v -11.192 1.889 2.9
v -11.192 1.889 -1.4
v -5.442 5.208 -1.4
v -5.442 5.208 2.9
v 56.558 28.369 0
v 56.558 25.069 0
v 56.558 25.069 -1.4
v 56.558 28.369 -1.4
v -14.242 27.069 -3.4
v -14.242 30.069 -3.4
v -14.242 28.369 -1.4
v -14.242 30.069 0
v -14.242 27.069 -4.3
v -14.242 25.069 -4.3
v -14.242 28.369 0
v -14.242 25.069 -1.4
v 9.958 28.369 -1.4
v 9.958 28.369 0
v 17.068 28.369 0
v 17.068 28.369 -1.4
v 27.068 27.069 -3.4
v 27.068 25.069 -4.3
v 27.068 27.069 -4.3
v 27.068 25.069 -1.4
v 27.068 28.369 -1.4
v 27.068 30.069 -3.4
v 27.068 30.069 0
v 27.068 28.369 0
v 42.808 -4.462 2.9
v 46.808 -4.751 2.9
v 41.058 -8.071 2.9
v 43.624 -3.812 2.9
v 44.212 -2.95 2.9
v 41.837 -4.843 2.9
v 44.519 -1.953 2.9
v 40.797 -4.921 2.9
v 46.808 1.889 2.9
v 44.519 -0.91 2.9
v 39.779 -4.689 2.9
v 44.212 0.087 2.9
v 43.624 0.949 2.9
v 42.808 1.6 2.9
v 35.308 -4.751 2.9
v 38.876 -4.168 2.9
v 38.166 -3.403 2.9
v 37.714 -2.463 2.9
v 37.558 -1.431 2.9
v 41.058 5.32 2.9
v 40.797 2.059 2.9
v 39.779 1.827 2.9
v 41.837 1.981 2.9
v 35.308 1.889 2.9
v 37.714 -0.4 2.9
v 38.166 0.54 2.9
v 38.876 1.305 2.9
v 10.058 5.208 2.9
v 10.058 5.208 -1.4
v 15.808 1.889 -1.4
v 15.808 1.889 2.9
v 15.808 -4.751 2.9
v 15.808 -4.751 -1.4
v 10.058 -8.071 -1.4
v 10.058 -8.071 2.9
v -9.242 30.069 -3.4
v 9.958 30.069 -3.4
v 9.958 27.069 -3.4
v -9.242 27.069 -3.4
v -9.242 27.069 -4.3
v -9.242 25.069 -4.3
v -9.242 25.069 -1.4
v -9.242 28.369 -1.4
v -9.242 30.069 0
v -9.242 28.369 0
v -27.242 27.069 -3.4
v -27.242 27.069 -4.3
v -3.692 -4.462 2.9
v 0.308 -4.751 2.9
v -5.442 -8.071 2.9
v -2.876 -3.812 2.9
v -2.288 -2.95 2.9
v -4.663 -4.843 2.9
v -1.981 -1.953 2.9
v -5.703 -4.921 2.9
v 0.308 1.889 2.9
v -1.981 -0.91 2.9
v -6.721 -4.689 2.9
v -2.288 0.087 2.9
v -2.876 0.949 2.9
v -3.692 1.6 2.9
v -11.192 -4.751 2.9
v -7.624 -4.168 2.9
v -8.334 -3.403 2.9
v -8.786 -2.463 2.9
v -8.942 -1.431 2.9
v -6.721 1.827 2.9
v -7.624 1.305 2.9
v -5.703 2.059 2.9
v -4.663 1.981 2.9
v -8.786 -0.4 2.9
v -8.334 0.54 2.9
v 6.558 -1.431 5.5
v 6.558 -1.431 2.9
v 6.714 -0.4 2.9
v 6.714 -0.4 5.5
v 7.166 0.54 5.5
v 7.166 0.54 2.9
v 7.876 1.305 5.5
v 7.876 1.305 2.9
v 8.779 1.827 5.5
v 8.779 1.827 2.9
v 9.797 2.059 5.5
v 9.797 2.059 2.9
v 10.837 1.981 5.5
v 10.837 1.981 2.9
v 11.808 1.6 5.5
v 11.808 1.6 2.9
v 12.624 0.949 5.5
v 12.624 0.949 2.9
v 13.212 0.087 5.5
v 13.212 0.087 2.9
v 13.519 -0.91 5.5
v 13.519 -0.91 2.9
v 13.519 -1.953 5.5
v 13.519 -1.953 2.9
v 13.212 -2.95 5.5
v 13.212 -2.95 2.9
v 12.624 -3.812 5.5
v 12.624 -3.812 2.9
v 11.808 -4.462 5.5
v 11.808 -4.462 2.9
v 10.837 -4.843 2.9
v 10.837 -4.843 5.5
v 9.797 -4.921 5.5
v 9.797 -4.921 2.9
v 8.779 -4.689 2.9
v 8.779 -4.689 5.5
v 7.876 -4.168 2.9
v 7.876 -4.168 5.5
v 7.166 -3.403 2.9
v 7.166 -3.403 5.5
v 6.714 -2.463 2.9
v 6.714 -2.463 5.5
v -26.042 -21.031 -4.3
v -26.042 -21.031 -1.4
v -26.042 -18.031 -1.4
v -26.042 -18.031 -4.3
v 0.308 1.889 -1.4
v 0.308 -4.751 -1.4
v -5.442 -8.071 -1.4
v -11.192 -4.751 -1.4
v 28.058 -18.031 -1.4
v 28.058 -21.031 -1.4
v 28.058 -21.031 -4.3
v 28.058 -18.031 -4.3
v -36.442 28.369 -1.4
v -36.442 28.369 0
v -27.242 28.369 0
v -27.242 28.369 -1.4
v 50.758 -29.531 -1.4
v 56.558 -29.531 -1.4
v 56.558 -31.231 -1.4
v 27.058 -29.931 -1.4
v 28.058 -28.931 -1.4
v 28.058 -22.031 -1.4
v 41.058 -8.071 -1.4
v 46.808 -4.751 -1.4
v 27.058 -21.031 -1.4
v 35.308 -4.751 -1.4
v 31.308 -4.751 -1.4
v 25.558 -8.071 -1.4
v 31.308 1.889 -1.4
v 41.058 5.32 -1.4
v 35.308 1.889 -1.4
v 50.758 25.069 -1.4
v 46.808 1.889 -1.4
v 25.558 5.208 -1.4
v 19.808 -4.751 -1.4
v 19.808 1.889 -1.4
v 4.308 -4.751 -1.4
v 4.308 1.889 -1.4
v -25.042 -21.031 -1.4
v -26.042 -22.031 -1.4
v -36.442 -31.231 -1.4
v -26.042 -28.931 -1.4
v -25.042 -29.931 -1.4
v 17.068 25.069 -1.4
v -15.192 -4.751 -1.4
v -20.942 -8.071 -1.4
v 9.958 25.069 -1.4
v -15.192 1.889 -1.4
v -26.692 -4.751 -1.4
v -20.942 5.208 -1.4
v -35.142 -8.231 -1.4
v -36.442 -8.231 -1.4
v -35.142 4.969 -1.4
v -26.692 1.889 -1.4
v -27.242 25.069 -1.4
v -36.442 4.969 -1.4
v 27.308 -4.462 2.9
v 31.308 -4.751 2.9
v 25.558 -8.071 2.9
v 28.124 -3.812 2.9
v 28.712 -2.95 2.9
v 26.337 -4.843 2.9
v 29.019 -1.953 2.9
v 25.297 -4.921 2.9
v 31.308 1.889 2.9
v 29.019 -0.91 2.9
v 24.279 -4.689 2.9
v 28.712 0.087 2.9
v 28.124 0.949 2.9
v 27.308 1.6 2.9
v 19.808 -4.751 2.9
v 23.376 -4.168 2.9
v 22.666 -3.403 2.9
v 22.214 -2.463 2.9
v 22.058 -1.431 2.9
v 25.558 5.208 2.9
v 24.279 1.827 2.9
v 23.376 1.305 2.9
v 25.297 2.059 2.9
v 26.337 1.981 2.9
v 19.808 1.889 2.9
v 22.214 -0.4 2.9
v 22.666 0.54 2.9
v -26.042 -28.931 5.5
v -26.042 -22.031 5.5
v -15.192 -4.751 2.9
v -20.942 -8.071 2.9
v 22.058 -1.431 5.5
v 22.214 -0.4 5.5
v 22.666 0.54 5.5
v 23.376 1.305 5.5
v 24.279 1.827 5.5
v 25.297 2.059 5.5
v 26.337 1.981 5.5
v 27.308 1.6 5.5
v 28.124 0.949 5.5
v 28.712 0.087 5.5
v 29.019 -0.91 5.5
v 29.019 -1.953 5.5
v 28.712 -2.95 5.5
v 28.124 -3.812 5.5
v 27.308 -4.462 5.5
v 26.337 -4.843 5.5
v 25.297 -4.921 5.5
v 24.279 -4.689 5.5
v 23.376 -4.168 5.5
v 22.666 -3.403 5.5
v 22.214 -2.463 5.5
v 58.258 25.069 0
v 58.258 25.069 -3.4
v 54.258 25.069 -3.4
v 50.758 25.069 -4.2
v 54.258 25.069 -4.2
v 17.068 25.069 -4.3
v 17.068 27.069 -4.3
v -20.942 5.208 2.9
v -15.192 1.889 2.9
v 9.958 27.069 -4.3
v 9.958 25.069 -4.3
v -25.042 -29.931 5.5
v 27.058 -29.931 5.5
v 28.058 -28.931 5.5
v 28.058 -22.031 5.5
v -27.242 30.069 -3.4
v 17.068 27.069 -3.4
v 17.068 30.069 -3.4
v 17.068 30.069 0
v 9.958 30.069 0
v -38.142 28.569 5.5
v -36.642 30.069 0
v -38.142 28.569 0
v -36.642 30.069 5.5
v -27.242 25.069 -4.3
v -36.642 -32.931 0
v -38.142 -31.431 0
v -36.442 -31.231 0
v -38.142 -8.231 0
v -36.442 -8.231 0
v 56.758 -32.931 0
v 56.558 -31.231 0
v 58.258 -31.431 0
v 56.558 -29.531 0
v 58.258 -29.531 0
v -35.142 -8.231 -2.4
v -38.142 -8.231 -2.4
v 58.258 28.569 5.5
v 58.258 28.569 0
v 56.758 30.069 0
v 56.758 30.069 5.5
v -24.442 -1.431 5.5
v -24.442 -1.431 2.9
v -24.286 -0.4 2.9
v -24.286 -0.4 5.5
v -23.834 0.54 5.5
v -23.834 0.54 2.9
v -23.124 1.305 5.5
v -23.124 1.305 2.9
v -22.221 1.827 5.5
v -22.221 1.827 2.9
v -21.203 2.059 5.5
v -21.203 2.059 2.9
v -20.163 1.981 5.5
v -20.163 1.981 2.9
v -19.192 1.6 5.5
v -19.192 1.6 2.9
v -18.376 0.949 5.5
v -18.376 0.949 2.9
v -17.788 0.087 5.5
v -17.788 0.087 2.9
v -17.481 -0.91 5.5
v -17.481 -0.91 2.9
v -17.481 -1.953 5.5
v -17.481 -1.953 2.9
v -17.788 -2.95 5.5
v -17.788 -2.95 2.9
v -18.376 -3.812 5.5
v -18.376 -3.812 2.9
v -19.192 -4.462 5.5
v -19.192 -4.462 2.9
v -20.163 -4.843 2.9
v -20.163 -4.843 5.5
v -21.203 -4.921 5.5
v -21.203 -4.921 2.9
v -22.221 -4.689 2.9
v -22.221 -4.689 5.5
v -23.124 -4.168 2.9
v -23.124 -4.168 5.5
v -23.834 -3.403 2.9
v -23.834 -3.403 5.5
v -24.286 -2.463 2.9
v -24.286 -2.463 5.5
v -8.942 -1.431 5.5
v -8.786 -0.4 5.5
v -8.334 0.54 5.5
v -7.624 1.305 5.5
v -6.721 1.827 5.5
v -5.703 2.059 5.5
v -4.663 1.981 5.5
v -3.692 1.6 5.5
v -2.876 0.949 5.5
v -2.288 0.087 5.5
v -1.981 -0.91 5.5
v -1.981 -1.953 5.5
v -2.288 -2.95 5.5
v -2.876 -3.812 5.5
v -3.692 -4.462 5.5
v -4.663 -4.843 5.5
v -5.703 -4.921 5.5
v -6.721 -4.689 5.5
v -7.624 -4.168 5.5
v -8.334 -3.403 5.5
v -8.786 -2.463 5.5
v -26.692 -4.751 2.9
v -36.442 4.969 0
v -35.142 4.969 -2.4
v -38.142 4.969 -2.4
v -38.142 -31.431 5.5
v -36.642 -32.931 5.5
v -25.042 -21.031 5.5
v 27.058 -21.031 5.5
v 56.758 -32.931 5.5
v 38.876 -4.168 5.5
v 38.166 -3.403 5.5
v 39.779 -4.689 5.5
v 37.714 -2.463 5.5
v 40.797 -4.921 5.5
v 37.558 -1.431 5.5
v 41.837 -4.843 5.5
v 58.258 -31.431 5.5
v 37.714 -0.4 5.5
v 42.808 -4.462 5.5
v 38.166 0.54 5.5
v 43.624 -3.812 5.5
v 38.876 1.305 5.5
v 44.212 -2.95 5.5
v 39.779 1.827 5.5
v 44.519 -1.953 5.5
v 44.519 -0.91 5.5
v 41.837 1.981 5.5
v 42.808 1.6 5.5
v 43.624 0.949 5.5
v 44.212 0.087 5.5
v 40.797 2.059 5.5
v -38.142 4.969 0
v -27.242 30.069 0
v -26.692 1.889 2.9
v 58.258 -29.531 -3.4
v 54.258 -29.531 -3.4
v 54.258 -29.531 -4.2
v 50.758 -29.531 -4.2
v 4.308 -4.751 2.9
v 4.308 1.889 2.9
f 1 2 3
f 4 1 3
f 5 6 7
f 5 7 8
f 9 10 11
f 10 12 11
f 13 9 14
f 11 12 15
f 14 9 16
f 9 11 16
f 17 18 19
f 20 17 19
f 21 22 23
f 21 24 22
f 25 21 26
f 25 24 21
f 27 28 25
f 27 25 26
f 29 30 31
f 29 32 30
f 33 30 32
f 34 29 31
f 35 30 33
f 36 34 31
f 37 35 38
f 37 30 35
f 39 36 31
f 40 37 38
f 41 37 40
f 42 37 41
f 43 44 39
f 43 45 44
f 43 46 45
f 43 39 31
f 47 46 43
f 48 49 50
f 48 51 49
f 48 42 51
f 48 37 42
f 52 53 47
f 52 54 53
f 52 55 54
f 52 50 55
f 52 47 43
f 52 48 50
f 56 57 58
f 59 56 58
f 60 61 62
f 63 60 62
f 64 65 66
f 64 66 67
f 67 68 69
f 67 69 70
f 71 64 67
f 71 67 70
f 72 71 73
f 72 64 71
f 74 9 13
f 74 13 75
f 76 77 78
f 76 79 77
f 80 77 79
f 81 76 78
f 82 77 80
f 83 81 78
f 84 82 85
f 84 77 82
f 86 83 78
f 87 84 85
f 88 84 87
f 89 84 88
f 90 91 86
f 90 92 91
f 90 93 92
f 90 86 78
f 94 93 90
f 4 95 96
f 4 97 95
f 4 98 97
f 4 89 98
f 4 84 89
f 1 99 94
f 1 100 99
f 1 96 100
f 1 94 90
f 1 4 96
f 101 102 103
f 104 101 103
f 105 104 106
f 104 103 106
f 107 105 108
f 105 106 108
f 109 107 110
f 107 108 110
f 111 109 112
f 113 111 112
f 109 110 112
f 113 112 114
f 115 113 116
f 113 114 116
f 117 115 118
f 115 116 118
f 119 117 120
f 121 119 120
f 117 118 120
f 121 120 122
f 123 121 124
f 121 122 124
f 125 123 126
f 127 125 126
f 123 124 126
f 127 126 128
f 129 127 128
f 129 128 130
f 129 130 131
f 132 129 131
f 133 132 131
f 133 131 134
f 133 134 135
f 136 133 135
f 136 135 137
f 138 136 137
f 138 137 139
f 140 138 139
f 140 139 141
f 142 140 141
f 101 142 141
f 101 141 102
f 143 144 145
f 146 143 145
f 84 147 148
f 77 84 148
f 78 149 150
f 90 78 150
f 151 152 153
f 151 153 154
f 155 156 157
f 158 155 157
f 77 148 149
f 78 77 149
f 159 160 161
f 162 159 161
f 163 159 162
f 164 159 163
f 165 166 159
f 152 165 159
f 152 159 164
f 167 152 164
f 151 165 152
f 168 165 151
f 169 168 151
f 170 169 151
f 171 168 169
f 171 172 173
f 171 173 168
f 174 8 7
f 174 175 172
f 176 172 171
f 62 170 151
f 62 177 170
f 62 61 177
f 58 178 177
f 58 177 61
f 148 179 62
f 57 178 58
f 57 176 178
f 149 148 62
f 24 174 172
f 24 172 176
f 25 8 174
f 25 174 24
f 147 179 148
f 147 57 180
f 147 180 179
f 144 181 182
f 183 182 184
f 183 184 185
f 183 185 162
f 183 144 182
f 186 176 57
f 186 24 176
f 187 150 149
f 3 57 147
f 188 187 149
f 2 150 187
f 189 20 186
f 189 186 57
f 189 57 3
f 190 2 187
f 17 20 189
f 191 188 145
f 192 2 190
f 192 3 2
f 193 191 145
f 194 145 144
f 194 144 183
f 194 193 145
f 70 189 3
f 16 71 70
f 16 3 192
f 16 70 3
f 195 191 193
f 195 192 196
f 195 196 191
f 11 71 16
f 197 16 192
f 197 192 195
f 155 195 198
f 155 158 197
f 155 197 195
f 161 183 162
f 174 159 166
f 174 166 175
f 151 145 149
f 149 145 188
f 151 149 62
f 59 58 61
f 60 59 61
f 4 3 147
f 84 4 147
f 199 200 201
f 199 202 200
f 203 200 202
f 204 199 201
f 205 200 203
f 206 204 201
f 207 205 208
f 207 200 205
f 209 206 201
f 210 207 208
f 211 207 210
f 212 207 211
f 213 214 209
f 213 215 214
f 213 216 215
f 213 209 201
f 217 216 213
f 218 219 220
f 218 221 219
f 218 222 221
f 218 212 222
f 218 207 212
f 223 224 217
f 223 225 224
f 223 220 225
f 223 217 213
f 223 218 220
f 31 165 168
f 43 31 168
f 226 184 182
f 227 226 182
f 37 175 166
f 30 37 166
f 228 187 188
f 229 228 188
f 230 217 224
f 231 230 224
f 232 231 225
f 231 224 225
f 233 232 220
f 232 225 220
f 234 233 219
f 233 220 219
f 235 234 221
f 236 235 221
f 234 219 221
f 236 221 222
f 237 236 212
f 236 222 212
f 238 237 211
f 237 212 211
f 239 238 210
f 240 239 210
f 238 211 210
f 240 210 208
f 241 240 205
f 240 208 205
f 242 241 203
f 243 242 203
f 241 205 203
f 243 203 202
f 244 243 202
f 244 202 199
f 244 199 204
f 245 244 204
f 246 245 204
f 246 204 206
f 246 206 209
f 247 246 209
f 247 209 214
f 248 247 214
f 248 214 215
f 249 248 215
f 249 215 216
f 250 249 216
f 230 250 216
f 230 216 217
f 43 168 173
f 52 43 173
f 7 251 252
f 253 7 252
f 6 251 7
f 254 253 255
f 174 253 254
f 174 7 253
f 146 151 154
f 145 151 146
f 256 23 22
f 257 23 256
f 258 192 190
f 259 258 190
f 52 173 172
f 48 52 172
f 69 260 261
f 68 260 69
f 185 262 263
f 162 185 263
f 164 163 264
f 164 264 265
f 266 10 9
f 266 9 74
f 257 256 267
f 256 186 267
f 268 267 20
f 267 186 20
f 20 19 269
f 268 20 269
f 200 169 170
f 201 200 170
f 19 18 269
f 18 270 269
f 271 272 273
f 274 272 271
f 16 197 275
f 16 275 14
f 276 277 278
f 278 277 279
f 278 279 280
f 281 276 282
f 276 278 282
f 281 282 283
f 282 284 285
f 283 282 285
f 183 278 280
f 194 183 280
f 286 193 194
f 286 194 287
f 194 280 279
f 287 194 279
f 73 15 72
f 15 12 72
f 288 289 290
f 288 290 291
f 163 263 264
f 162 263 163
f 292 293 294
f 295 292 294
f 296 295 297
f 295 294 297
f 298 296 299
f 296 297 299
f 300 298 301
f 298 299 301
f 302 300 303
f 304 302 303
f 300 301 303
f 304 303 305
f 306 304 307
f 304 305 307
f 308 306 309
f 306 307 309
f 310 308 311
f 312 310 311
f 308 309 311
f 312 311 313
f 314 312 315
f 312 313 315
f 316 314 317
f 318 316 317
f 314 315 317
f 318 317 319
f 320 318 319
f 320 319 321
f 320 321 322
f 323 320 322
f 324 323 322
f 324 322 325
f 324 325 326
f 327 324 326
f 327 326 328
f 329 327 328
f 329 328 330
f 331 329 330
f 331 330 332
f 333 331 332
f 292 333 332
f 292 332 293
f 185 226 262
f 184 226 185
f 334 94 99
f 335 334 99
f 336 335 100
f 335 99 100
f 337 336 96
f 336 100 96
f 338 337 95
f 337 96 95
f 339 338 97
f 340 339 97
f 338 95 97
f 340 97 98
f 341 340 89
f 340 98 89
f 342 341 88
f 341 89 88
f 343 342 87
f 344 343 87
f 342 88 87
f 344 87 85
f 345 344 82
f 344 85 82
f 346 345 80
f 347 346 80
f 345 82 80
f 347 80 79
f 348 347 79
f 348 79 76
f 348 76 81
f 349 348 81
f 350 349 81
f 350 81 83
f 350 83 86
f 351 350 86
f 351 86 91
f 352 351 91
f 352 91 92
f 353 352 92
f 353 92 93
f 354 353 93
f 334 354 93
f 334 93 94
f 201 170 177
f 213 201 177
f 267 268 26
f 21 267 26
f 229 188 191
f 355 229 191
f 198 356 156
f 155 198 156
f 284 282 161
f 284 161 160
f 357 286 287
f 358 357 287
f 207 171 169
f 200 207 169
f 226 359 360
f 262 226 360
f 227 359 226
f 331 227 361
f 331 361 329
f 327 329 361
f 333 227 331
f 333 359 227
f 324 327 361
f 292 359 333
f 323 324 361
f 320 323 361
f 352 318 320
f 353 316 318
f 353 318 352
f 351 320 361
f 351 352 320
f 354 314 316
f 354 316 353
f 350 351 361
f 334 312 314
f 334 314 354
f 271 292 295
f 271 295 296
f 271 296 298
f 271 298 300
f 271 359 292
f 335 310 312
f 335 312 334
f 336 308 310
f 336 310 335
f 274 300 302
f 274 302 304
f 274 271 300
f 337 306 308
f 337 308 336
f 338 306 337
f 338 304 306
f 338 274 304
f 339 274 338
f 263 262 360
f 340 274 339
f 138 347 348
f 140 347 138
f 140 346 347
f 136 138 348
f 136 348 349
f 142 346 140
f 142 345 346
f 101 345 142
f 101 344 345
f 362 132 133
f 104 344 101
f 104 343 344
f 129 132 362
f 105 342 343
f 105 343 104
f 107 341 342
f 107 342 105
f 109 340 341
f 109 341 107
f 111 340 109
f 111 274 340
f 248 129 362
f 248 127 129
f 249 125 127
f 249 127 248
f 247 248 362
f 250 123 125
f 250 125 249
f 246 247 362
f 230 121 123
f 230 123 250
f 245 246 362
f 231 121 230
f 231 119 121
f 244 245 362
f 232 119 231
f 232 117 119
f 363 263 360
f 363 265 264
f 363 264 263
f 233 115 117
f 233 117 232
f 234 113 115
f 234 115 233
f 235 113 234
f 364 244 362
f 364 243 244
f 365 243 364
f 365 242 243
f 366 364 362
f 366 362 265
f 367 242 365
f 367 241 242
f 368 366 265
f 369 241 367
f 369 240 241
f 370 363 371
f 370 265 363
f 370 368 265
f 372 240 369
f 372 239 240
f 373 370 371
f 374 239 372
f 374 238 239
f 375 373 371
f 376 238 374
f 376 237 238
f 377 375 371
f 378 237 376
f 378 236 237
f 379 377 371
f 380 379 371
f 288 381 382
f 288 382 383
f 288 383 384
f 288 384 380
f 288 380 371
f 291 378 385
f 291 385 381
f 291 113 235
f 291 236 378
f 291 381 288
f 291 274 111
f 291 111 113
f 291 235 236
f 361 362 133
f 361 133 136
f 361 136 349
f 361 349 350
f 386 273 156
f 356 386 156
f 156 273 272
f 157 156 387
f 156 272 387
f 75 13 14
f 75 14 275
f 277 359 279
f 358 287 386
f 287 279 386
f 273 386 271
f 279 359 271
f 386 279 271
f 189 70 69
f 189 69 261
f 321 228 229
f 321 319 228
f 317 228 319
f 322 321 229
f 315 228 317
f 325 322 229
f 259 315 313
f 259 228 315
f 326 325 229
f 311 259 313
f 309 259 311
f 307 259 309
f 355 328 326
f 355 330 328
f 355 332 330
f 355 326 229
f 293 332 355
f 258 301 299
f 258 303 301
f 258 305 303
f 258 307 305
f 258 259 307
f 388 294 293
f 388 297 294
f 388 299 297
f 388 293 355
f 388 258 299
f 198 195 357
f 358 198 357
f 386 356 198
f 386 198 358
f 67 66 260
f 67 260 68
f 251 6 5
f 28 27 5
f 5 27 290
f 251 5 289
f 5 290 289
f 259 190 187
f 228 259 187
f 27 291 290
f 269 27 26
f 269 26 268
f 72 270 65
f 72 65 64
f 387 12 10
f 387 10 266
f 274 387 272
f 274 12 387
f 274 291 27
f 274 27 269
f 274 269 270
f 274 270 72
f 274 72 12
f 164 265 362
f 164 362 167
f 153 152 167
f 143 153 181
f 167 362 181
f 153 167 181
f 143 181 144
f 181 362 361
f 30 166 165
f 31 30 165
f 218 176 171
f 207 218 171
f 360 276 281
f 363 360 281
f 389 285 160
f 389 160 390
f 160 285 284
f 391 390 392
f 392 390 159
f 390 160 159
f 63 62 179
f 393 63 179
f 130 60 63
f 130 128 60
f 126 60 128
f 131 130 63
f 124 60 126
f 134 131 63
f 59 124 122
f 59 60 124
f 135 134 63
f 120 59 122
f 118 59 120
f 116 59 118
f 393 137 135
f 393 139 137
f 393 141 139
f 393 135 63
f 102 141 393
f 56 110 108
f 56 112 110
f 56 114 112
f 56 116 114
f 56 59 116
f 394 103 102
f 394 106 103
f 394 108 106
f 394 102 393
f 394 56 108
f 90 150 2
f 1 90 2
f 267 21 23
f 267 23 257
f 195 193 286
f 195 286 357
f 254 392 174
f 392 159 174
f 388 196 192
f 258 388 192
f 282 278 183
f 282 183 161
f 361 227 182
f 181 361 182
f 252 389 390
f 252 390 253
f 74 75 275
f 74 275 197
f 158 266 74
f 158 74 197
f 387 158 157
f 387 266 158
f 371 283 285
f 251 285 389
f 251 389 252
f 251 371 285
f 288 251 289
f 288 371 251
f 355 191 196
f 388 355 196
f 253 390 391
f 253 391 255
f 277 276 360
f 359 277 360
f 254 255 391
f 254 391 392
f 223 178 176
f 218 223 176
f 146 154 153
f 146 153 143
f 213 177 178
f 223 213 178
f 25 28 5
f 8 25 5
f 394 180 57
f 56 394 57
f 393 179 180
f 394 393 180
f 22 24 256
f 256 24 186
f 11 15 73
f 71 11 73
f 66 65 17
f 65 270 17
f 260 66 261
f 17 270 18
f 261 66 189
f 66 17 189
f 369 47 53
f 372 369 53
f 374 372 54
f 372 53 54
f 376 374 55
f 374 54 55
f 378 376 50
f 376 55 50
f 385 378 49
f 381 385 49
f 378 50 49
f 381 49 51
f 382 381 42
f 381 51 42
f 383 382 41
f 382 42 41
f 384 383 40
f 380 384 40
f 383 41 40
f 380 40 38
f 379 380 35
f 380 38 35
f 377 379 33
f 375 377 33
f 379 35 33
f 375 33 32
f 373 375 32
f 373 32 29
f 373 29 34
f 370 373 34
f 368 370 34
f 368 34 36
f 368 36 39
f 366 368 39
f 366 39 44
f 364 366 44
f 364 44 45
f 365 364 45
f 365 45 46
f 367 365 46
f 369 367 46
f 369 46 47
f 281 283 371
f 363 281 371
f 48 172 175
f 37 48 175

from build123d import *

# Parameters (mm, degrees)
SKETCH1_W            = 96.4
SKETCH1_H            = 63
BOSS_EXTRUDE1_DEPTH  = 5.5
SKETCH1_5_W          = 93
SKETCH1_5_H          = 59.6
BOSS_EXTRUDE2_DEPTH  = 1.4
CHAMFER1_SIZE        = 1.5
SKETCH3_W            = 1.7
SKETCH3_H            = 13.2
BOSS_EXTRUDE4_DEPTH  = 1.7
SKETCH4_W            = 13
SKETCH4_H            = 1.7
SKETCH4_W_2          = 10
SKETCH4_W_3          = 19.2
BOSS_EXTRUDE5_DEPTH  = 1.6
SKETCH4_3_W          = 13
SKETCH4_3_H          = 3
SKETCH4_3_W_2        = 10
SKETCH4_3_W_3        = 19.2
BOSS_EXTRUDE6_DEPTH  = 2
SKETCH3_5_W          = 3
SKETCH3_5_H          = 13.2
BOSS_EXTRUDE7_DEPTH  = 1
SKETCH5_W            = 1.7
SKETCH5_H            = 54.6
BOSS_EXTRUDE8_DEPTH  = 1.6
SKETCH5_3_W          = 3
SKETCH5_3_H          = 54.6
BOSS_EXTRUDE9_DEPTH  = 2
SKETCH7_W            = 54.1
SKETCH7_H            = 8.9
CUT_EXTRUDE2_DEPTH   = 12
CHAMFER2_SIZE        = 1
SKETCH11_W           = 10
SKETCH11_H           = 2
SKETCH11_W_2         = 19.2
SKETCH11_W_3         = 13
BOSS_EXTRUDE10_DEPTH = 2
SKETCH13_W           = 10
SKETCH13_H           = 2
SKETCH13_W_2         = 19.2
SKETCH13_W_3         = 13
BOSS_EXTRUDE12_DEPTH = 0.9
SKETCH14_W           = 54.1
SKETCH14_H           = 3
BOSS_EXTRUDE13_DEPTH = 2.9
SKETCH15_W           = 2
SKETCH15_H           = 54.6
BOSS_EXTRUDE14_DEPTH = 4.5
SKETCH16_W           = 3.5
SKETCH16_H           = 54.6
BOSS_EXTRUDE15_DEPTH = 0.8
SKETCH18_R           = 3.5
CUT_EXTRUDE4_DEPTH   = 12
CUT_EXTRUDE5_DEPTH   = 4.3


with BuildPart() as part:
    # Sketch1 → Boss-Extrude1 (new body)
    with BuildSketch(Plane.XY):
        with Locations((10.058192988, -1.431154761)):
            Rectangle(SKETCH1_W, SKETCH1_H)
    extrude(amount=BOSS_EXTRUDE1_DEPTH)

    # Sketch1<5> → Boss-Extrude2 (add)
    with BuildSketch(Plane.XY):
        with Locations((10.058192988, -1.431154761)):
            Rectangle(SKETCH1_5_W, SKETCH1_5_H)
    extrude(amount=-BOSS_EXTRUDE2_DEPTH)

    # Chamfer1
    chamfer1_edges = [part.edges().sort_by_distance(p)[0] for p in [
        (58.258192988, 30.068845239, 2.75),
        (-38.141807012, 30.068845239, 2.75),
        (-38.141807012, -32.931154761, 2.75),
        (58.258192988, -32.931154761, 2.75),
    ]]
    chamfer(chamfer1_edges, length=CHAMFER1_SIZE)

    # Sketch3 → Boss-Extrude4 (add)
    with BuildSketch(Plane(origin=(0, 0, -1.4), x_dir=(-1, 0, 0), z_dir=(0, 0, -1))):
        with Locations((37.291807012, -1.631154761)):
            Rectangle(SKETCH3_W, SKETCH3_H)
    extrude(amount=-BOSS_EXTRUDE4_DEPTH)

    # Sketch4 → Boss-Extrude5 (add)
    with BuildSketch(Plane(origin=(0, 0, -1.4), x_dir=(-1, 0, 0), z_dir=(0, 0, -1))):
        with Locations((20.741807012, 29.218845239)):
            Rectangle(SKETCH4_W, SKETCH4_H)
        with Locations((-22.068192988, 29.218845239)):
            Rectangle(SKETCH4_W_2, SKETCH4_H)
        with Locations((-0.358192988, 29.218845239)):
            Rectangle(SKETCH4_W_3, SKETCH4_H)
    extrude(amount=-BOSS_EXTRUDE5_DEPTH)

    # Sketch4<3> → Boss-Extrude6 (add)
    with BuildSketch(Plane(origin=(0, 0, -1.4), x_dir=(-1, 0, 0), z_dir=(0, 0, -1))):
        with Locations((20.741807012, 28.568845239)):
            Rectangle(SKETCH4_3_W, SKETCH4_3_H)
        with Locations((-22.068192988, 28.568845239)):
            Rectangle(SKETCH4_3_W_2, SKETCH4_3_H)
        with Locations((-0.358192988, 28.568845239)):
            Rectangle(SKETCH4_3_W_3, SKETCH4_3_H)
    extrude(amount=BOSS_EXTRUDE6_DEPTH)

    # Sketch3<5> → Boss-Extrude7 (add)
    with BuildSketch(Plane(origin=(0, 0, -1.4), x_dir=(-1, 0, 0), z_dir=(0, 0, -1))):
        with Locations((36.641807012, -1.631154761)):
            Rectangle(SKETCH3_5_W, SKETCH3_5_H)
    extrude(amount=BOSS_EXTRUDE7_DEPTH)

    # Sketch5 → Boss-Extrude8 (add)
    with BuildSketch(Plane(origin=(0, 0, -1.4), x_dir=(-1, 0, 0), z_dir=(0, 0, -1))):
        with Locations((-57.408192988, -2.231154761)):
            Rectangle(SKETCH5_W, SKETCH5_H)
    extrude(amount=-BOSS_EXTRUDE8_DEPTH)

    # Sketch5<3> → Boss-Extrude9 (add)
    with BuildSketch(Plane(origin=(0, 0, -1.4), x_dir=(-1, 0, 0), z_dir=(0, 0, -1))):
        with Locations((-56.758192988, -2.231154761)):
            Rectangle(SKETCH5_3_W, SKETCH5_3_H)
    extrude(amount=BOSS_EXTRUDE9_DEPTH)

    # Sketch7 → Cut-Extrude2 (cut)
    with BuildSketch(Plane.XY.offset(5.5)):
        with Locations((1.008192988, -25.481154761)):
            Rectangle(SKETCH7_W, SKETCH7_H)
    extrude(amount=-CUT_EXTRUDE2_DEPTH, mode=Mode.SUBTRACT)

    # Chamfer2
    chamfer2_edges = [part.edges().sort_by_distance(p)[0] for p in [
        (28.058192988, -21.031154761, 2.05),
        (28.058192988, -29.931154761, 2.05),
        (-26.041807012, -29.931154761, 2.05),
        (-26.041807012, -21.031154761, 2.05),
    ]]
    chamfer(chamfer2_edges, length=CHAMFER2_SIZE)

    # Sketch11 → Boss-Extrude10 (add)
    with BuildSketch(Plane.XZ.offset(-27.068845239)):
        with Locations((22.068192988, -2.4)):
            Rectangle(SKETCH11_W, SKETCH11_H)
        with Locations((0.358192988, -2.4)):
            Rectangle(SKETCH11_W_2, SKETCH11_H)
        with Locations((-20.741807012, -2.4)):
            Rectangle(SKETCH11_W_3, SKETCH11_H)
    extrude(amount=BOSS_EXTRUDE10_DEPTH)

    # Sketch13 → Boss-Extrude12 (add)
    with BuildSketch(Plane(origin=(0, 0, -3.4), x_dir=(-1, 0, 0), z_dir=(0, 0, -1))):
        with Locations((-22.068192988, 26.068845239)):
            Rectangle(SKETCH13_W, SKETCH13_H)
        with Locations((-0.358192988, 26.068845239)):
            Rectangle(SKETCH13_W_2, SKETCH13_H)
        with Locations((20.741807012, 26.068845239)):
            Rectangle(SKETCH13_W_3, SKETCH13_H)
    extrude(amount=BOSS_EXTRUDE12_DEPTH)

    # Sketch14 → Boss-Extrude13 (add)
    with BuildSketch(Plane(origin=(0, 0, -1.4), x_dir=(-1, 0, 0), z_dir=(0, 0, -1))):
        with Locations((-1.008192988, -19.531154761)):
            Rectangle(SKETCH14_W, SKETCH14_H)
    extrude(amount=BOSS_EXTRUDE13_DEPTH)

    # Sketch15 → Boss-Extrude14 (add)
    with BuildSketch(Plane.ZY.offset(-55.258192988)):
        with Locations((-2.4, -2.231154761)):
            Rectangle(SKETCH15_W, SKETCH15_H)
    extrude(amount=BOSS_EXTRUDE14_DEPTH)

    # Sketch16 → Boss-Extrude15 (add)
    with BuildSketch(Plane(origin=(0, 0, -3.4), x_dir=(-1, 0, 0), z_dir=(0, 0, -1))):
        with Locations((-52.508192988, -2.231154761)):
            Rectangle(SKETCH16_W, SKETCH16_H)
    extrude(amount=BOSS_EXTRUDE15_DEPTH)

    # Sketch18 → Cut-Extrude4 (cut)
    with BuildSketch(Plane(origin=(0, 0, -1.4), x_dir=(-1, 0, 0), z_dir=(0, 0, -1))):
        with Locations((-41.058192988, -1.431154761)):
            Circle(SKETCH18_R)
        with Locations((-25.558192988, -1.431154761)):
            Circle(SKETCH18_R)
        with Locations((-10.058192988, -1.431154761)):
            Circle(SKETCH18_R)
        with Locations((5.441807012, -1.431154761)):
            Circle(SKETCH18_R)
        with Locations((20.941807012, -1.431154761)):
            Circle(SKETCH18_R)
    extrude(amount=-CUT_EXTRUDE4_DEPTH, mode=Mode.SUBTRACT)

    # Sketch18<3> → Cut-Extrude5 (cut)
    with BuildSketch(Plane(origin=(0, 0, -1.4), x_dir=(-1, 0, 0), z_dir=(0, 0, -1))):
        Polygon((-41.058192988, -8.070682857), (-35.308192988, -4.750918809), (-35.308192988, 1.888609286), (-41.058192988, 5.319984429), (-46.808192988, 1.888609286), (-46.808192988, -4.750918809), align=None)
        Polygon((-25.558192988, 5.208373334), (-31.308192988, 1.888609286), (-31.308192988, -4.750918809), (-25.558192988, -8.070682857), (-19.808192988, -4.750918809), (-19.808192988, 1.888609286), align=None)
        Polygon((-10.058192988, 5.208373334), (-15.808192988, 1.888609286), (-15.808192988, -4.750918809), (-10.058192988, -8.070682857), (-4.308192988, -4.750918809), (-4.308192988, 1.888609286), align=None)
        Polygon((5.441807012, 5.208373334), (-0.308192988, 1.888609286), (-0.308192988, -4.750918809), (5.441807012, -8.070682857), (11.191807012, -4.750918809), (11.191807012, 1.888609286), align=None)
        Polygon((20.941807012, 5.208373334), (15.191807012, 1.888609286), (15.191807012, -4.750918809), (20.941807012, -8.070682857), (26.691807012, -4.750918809), (26.691807012, 1.888609286), align=None)
    extrude(amount=-CUT_EXTRUDE5_DEPTH, mode=Mode.SUBTRACT)


solid = part.part
